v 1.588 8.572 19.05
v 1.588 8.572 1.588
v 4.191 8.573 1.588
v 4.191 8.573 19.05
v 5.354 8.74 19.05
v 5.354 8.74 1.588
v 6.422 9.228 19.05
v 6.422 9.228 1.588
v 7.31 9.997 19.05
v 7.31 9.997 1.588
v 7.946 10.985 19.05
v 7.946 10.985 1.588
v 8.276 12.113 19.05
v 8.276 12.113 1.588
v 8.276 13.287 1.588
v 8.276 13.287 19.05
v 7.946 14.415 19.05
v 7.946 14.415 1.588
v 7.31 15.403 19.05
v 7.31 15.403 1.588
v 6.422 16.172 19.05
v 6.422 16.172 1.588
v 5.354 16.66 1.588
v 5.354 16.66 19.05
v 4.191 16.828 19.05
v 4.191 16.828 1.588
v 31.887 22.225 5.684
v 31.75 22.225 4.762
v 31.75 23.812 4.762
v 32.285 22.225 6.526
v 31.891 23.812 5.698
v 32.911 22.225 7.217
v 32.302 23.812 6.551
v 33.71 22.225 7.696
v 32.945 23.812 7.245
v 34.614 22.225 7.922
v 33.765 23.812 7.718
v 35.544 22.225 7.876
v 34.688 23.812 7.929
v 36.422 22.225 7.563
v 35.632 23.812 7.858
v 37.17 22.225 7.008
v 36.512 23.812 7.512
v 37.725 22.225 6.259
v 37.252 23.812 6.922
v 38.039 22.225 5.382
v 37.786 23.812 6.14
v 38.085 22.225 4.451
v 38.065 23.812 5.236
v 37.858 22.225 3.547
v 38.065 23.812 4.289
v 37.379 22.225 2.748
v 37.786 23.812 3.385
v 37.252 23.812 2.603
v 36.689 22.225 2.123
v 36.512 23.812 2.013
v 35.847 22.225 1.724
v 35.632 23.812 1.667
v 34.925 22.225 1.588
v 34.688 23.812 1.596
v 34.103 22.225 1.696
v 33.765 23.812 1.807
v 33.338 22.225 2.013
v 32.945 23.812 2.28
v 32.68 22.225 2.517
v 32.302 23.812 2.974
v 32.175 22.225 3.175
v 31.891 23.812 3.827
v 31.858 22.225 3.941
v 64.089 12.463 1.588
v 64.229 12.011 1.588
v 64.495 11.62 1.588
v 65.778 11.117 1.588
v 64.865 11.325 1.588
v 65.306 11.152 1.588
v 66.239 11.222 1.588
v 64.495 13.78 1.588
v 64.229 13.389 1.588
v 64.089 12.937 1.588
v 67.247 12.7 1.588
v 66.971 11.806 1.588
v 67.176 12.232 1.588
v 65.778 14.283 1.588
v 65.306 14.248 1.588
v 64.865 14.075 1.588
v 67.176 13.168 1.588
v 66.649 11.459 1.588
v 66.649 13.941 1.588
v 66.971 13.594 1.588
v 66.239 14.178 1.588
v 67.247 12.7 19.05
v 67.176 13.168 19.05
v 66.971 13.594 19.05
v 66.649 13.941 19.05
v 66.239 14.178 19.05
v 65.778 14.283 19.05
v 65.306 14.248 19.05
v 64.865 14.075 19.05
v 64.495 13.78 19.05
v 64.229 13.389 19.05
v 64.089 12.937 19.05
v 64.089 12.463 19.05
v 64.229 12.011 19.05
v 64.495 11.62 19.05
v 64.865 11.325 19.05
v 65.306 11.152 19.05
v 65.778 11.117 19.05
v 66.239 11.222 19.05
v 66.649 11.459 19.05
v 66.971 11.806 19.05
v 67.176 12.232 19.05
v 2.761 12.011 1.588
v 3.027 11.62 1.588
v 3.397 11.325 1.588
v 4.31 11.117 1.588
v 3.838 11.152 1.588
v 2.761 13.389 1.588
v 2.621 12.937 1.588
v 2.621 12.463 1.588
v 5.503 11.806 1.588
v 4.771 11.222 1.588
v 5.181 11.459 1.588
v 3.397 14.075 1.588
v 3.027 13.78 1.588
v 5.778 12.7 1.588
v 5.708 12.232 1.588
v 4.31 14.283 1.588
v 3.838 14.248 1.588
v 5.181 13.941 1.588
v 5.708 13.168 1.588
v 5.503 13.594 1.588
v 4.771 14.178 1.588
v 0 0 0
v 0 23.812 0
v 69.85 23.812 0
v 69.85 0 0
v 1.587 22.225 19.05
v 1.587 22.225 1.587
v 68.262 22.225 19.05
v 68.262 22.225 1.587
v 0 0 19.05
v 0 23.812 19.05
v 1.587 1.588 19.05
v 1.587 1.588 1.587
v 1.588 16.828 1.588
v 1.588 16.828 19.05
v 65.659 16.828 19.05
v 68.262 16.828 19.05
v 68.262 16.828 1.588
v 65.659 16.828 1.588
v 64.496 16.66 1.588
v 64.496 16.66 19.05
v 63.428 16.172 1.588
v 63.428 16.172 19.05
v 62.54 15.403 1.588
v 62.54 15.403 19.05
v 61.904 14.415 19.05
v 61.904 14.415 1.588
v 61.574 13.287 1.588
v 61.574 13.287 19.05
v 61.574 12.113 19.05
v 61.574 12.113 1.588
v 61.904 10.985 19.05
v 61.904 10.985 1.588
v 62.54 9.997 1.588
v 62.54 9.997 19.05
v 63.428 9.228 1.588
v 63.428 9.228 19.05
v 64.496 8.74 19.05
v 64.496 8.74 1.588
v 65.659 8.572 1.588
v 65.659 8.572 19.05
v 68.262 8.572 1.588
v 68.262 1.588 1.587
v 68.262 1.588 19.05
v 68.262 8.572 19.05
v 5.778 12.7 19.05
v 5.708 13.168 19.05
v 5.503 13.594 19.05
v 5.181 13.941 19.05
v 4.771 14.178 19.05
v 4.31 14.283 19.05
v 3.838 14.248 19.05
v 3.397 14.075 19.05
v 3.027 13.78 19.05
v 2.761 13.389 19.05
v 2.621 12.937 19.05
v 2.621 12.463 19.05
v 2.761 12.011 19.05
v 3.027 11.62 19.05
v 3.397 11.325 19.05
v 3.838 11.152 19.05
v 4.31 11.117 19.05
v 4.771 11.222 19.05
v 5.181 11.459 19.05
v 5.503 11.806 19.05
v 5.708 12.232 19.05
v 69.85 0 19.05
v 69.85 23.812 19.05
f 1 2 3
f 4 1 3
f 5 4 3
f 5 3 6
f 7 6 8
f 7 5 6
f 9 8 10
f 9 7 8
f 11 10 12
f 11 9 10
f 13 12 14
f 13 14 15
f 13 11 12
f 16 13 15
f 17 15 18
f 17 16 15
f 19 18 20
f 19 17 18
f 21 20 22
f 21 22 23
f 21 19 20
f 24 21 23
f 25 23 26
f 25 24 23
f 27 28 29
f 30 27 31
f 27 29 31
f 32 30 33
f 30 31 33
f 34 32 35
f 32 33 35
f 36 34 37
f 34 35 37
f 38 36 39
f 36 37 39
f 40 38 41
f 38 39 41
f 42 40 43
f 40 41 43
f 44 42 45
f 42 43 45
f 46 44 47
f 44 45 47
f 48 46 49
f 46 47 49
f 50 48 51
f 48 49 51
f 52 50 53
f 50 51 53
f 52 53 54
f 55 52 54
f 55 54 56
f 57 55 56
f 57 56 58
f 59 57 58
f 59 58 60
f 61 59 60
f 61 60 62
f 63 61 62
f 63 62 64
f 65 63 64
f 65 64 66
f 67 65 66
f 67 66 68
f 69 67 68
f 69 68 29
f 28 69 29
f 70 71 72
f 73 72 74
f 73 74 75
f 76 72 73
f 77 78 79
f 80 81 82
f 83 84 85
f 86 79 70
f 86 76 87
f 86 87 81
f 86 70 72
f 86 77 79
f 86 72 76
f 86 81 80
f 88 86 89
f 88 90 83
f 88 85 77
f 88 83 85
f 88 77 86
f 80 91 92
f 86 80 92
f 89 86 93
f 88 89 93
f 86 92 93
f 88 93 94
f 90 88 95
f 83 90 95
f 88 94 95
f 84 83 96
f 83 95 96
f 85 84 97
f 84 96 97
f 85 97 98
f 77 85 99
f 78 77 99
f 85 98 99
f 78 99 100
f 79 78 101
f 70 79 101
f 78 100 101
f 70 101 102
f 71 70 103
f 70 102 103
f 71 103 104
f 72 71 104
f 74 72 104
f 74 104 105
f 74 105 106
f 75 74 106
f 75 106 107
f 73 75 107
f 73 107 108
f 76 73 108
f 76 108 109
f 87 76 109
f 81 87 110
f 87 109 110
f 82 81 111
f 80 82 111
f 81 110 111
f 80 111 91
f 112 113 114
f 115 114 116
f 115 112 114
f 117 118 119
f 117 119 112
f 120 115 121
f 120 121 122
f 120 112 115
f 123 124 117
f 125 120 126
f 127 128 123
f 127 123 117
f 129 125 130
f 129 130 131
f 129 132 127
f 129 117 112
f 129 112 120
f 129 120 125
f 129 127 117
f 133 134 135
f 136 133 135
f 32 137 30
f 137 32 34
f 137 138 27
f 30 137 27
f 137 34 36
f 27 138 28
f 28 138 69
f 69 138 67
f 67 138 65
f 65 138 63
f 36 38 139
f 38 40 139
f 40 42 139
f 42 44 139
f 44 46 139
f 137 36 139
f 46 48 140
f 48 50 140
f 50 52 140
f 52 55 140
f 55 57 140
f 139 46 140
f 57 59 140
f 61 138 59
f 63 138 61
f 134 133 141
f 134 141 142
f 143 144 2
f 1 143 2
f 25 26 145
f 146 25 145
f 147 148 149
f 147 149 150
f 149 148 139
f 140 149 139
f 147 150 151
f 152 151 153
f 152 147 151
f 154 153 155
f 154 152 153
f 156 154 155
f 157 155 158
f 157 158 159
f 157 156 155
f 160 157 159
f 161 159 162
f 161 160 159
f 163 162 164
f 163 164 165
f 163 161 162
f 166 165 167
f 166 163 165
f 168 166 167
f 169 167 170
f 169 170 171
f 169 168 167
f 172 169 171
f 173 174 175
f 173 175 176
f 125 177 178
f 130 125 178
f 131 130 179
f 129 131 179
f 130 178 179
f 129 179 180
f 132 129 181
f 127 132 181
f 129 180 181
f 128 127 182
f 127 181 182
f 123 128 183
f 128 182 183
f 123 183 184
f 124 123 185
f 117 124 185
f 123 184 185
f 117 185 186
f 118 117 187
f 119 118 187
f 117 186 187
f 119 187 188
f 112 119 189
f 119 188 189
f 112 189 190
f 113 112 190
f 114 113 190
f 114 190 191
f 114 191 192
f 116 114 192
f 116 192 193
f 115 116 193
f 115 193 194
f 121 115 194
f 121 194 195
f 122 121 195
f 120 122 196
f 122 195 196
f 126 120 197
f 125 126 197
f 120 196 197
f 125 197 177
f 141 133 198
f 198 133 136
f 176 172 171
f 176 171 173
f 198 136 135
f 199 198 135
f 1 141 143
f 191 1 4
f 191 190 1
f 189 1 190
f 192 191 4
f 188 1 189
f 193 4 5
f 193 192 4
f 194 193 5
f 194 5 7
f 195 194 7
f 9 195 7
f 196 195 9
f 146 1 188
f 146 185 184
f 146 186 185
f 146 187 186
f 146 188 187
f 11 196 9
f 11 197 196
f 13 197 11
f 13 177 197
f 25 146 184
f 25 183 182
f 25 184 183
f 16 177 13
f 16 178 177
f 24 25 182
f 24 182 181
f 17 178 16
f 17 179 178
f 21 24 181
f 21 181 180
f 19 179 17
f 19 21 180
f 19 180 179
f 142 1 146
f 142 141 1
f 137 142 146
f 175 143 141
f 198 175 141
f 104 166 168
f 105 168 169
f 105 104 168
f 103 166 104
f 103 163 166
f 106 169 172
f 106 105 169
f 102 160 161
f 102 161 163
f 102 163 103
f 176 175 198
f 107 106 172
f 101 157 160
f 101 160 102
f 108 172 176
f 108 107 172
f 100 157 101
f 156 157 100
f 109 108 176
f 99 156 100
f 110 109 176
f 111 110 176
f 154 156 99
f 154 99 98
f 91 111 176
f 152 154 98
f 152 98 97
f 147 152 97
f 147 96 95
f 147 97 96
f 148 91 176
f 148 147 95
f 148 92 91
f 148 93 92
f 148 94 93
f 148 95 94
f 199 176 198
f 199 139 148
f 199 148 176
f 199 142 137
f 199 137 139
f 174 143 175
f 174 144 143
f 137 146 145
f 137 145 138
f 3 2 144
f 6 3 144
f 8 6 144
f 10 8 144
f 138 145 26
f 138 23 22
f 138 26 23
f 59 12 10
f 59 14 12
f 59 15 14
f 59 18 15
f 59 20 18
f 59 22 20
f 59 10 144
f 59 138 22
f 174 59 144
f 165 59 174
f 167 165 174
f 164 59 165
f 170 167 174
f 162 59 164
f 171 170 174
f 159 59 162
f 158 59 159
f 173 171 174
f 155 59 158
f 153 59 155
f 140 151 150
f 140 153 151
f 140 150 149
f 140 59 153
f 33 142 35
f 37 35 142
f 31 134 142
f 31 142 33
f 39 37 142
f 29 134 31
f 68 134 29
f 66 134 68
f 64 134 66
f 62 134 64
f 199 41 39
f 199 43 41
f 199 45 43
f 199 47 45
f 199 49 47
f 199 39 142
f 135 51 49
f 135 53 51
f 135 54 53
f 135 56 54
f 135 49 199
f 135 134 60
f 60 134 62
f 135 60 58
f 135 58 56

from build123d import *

# Parameters (mm, degrees)
F1_W     = 69.85
F1_H     = 23.8125
F2_DEPTH = 19.05
F3_T     = -1.5875
F4_R     = 1.5875
F5_DEPTH = 17.4625
F6_R     = 3.175
F7_DEPTH = 1.5875


with BuildPart() as f2:
    # F1 (on Top) → F2 (new body)
    with BuildSketch(Plane.XY):
        with Locations((34.925, 11.90625)):
            Rectangle(F1_W, F1_H)
    extrude(amount=F2_DEPTH)

    # F3
    f3_openings = [f2.faces().sort_by_distance(p)[0] for p in [
        (34.925, 11.90625, 19.05),
    ]]
    offset(amount=F3_T, openings=f3_openings)

    # F4 (on face) → F5 (join, through all)
    with BuildSketch(Plane.XY.offset(19.05)):
        with BuildLine():
            Line((1.5875, 8.5725), (4.191, 8.5725))
            ThreePointArc((4.191, 8.5725), (8.3185, 12.7), (4.191, 16.8275))
            Line((4.191, 16.8275), (1.5875, 16.8275))
            Line((1.5875, 16.8275), (1.5875, 8.5725))
        make_face()
        with Locations((4.191, 12.7)):
            Circle(F4_R, mode=Mode.SUBTRACT)
        with BuildLine():
            Line((65.659, 8.5725), (68.2625, 8.5725))
            Line((68.2625, 8.5725), (68.2625, 16.8275))
            Line((68.2625, 16.8275), (65.659, 16.8275))
            ThreePointArc((65.659, 16.8275), (61.5315, 12.7), (65.659, 8.5725))
        make_face()
        with Locations((65.659, 12.7)):
            Circle(F4_R, mode=Mode.SUBTRACT)
    extrude(amount=-F5_DEPTH)

    # F6 (on face) → F7 (cut, through all)
    with BuildSketch(Plane(origin=(0, 23.8125, 0), x_dir=(-1, 0, 0), z_dir=(0, 1, 0))):
        with Locations((-34.925, 4.7625)):
            Circle(F6_R)
    extrude(amount=-F7_DEPTH, mode=Mode.SUBTRACT)


solid = f2.part
